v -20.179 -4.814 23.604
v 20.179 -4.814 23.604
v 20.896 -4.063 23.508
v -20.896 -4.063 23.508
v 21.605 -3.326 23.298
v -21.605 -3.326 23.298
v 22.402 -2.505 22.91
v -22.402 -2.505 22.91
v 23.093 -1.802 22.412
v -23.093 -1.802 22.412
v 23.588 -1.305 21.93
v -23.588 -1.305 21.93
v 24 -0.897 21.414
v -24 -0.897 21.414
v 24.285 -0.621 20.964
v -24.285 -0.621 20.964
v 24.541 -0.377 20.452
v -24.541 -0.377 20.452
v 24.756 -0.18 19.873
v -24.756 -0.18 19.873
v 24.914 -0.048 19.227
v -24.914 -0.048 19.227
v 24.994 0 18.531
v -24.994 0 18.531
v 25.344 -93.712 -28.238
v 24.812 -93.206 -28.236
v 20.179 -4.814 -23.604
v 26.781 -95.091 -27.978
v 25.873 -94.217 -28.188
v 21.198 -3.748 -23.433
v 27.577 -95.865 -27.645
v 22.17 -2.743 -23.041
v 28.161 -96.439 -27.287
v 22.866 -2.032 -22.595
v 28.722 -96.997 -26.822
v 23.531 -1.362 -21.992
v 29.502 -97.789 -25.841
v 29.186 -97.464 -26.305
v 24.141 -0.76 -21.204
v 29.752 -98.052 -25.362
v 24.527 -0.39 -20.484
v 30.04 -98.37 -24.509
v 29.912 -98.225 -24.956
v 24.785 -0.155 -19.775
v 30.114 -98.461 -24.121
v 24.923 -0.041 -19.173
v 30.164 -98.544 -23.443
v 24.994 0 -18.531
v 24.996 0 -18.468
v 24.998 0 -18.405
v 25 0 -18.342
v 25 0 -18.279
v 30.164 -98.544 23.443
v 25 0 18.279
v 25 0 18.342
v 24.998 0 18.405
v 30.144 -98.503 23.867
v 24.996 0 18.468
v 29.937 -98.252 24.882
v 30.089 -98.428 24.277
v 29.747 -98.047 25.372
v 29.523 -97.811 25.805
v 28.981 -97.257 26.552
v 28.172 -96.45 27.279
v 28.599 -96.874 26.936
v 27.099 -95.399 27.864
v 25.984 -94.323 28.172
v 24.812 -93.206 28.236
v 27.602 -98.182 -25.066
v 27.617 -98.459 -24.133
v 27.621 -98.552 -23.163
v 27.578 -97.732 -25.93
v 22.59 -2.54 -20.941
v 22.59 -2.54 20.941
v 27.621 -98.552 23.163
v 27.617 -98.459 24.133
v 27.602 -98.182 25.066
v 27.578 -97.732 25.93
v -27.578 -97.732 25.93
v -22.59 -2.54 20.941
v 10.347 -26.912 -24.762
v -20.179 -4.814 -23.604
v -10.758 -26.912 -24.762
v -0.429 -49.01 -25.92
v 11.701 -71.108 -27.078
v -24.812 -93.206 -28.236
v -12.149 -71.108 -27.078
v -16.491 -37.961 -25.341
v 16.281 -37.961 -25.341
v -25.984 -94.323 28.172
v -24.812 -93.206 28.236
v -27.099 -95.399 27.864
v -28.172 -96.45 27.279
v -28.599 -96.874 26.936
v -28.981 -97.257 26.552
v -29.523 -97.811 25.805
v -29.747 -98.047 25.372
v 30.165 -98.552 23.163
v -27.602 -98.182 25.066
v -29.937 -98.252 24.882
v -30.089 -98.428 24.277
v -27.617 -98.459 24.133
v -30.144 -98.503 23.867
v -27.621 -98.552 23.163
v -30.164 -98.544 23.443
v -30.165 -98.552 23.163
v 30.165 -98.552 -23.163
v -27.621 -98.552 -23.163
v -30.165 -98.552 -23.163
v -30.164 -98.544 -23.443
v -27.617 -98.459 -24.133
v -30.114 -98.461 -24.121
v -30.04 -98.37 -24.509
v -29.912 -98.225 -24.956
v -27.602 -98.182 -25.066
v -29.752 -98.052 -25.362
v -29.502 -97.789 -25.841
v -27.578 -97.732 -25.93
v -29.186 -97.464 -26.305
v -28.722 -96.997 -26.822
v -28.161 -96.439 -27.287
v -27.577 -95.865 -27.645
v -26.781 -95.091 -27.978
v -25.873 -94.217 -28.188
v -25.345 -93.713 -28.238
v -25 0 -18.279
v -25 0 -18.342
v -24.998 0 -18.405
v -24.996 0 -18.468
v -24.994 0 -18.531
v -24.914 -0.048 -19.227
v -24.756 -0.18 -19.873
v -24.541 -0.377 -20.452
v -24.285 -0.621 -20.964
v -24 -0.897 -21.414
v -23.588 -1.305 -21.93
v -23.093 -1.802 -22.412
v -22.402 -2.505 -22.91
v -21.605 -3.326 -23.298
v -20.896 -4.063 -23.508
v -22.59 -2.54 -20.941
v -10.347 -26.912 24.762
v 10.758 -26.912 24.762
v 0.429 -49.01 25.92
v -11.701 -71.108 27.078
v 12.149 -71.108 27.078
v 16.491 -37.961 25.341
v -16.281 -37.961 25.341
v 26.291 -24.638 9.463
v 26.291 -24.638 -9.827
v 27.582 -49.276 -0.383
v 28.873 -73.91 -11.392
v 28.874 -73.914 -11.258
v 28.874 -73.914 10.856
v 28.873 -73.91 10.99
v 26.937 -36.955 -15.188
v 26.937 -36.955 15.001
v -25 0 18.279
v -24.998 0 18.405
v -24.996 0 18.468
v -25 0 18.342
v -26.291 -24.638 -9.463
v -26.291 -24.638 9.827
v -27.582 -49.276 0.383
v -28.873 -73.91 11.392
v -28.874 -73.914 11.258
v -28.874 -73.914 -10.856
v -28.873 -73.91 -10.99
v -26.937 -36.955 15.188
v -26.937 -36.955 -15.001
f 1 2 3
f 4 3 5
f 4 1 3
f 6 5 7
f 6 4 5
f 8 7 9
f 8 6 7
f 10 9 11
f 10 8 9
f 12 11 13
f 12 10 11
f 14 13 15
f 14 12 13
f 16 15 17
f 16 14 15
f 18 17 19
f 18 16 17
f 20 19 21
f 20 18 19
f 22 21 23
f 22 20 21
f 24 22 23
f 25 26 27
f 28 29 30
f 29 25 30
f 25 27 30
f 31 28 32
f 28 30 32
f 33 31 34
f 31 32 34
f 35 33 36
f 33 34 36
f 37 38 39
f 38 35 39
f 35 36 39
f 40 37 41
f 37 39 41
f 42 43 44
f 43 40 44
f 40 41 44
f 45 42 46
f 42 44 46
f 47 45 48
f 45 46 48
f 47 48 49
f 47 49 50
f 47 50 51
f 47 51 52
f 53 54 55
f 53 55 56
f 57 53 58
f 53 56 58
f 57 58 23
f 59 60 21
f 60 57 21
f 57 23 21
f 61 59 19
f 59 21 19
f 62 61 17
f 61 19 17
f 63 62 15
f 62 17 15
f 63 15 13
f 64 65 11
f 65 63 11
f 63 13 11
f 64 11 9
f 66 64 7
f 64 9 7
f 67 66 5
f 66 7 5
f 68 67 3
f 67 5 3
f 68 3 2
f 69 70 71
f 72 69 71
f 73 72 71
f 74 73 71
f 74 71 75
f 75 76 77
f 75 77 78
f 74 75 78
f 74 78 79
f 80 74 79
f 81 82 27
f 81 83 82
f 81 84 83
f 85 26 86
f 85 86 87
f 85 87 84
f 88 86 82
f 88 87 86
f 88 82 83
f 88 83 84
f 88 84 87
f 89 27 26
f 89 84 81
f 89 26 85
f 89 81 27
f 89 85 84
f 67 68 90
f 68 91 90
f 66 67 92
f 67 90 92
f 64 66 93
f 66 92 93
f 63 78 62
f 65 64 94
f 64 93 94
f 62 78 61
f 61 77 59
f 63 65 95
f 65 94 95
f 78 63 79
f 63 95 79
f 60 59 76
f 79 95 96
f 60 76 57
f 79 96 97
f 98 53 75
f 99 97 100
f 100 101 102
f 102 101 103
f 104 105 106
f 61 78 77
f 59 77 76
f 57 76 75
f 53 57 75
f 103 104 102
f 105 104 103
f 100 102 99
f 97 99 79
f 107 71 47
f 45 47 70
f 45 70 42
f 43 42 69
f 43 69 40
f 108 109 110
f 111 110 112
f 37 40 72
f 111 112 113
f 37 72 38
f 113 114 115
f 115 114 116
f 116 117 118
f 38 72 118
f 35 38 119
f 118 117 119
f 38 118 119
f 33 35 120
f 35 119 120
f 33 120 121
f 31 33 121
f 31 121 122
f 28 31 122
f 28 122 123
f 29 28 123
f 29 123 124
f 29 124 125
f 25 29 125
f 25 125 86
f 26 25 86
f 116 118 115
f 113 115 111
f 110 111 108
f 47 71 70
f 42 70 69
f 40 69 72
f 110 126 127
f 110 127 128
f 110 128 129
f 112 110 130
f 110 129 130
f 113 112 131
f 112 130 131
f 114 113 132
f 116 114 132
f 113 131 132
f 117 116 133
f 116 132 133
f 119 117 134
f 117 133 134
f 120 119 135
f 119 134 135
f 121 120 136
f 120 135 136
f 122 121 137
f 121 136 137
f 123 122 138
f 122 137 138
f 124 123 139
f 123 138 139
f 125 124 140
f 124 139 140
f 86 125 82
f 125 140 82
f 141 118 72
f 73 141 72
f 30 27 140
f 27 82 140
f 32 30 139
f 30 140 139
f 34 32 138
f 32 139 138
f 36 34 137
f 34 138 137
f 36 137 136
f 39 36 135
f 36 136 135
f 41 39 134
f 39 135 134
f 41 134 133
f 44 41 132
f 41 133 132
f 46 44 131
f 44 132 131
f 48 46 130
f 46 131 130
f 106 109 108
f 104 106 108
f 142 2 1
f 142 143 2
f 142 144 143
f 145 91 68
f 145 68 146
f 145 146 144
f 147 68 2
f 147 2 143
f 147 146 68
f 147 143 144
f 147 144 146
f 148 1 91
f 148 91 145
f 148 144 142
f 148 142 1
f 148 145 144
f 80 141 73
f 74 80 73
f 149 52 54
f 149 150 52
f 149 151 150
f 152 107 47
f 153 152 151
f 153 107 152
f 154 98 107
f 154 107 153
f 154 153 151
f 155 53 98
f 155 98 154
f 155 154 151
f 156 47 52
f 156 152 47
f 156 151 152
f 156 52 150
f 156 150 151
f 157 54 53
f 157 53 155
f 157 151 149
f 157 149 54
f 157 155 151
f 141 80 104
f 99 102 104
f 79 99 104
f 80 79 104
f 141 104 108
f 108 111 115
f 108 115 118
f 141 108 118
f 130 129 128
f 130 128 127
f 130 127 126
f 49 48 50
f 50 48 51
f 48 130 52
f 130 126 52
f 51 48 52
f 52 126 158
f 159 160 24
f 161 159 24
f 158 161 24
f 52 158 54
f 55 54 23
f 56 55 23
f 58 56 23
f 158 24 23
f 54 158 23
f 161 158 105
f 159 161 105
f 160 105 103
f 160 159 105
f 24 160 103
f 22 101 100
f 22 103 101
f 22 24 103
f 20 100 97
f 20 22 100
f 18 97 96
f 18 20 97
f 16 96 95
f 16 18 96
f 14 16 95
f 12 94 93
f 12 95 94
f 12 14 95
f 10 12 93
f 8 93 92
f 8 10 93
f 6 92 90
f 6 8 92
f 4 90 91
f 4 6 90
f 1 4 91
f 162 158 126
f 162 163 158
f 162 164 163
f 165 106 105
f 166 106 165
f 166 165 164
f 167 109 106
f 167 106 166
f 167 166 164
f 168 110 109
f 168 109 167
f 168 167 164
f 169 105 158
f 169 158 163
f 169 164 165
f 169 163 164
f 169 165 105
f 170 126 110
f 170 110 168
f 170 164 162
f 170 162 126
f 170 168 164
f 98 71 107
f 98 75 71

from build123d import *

# Parameters (mm, degrees)
F0_W        = 50
F0_H        = 46.7033070608
F1_DEPTH    = 98.552
F1_TAPER    = -3
F2_T        = -2.54
F3_T1_DEPTH = 74.1036999946
F3_T3_DEPTH = 124.1528328785
F3_T5_DEPTH = 87.0957981099
F3_T7_DEPTH = 124.1528328785
F4_T1_DEPTH = 74.1036999946
F4_T3_DEPTH = 124.1528328785
F4_T5_DEPTH = 87.0957981099
F4_T7_DEPTH = 124.1528328785


# Not quite as in the source:
# - a fillet or chamfer that OpenCascade refuses, or shapes differently, is made with other operations: its cross-section is extruded or revolved along the edge and cut away or added


with BuildPart() as f1:
    # F0 (on Front) → F1 (new body)
    with BuildSketch(Plane.XZ):
        Rectangle(F0_W, F0_H)
    extrude(amount=F1_DEPTH, taper=F1_TAPER)

    # F2
    f2_openings = [f1.faces().sort_by_distance(p)[0] for p in [
        (0, -98.552, 0),
    ]]
    offset(amount=F2_T, openings=f2_openings)

    # F3: fillet of radius 5.08 on 4 edges, made by hand

    # F3_s2 → F3_t1 (cut)
    with BuildSketch(Plane.YZ.offset(-37.0518499973)):
        with BuildLine():
            ThreePointArc((-4.8141333423, 23.6039515681), (-1.3950981953, 22.027754776), (0, 18.5309135315))
            Line((0, 18.5309135315), (0, 23.3516535304))
            Line((0, 23.3516535304), (-4.8141333423, 23.6039515681))
        make_face()
    extrude(amount=F3_T1_DEPTH, mode=Mode.SUBTRACT)

    # F3_s4 → F3_t3 (cut)
    with BuildSketch(Plane(origin=(0.5298667006, 10.1104589396, -0.5298667006), x_dir=(0.9986295348, -0.0523359562, 0), z_dir=(-0.0522644277, -0.9972646886, 0.0522644277))):
        with BuildLine():
            ThreePointArc((-24.9657383689, 18.1852510398), (-23.4827569315, 21.7724306367), (-19.8996527546, 23.2652319837))
            Line((-19.8996527546, 23.2652319837), (-24.9657383689, 23.2513556581))
            Line((-24.9657383689, 23.2513556581), (-24.9657383689, 18.1852510398))
        make_face()
    extrude(amount=F3_T3_DEPTH, mode=Mode.SUBTRACT)

    # F3_s6 → F3_t5 (cut)
    with BuildSketch(Plane.YZ.offset(-43.547899055)):
        with BuildLine():
            ThreePointArc((-93.2061333423, 28.2363799944), (-96.9688412445, 26.8482437626), (-98.552, 23.1633419579))
            Line((-98.552, 23.1633419579), (-98.552, 28.5165449943))
            Line((-98.552, 28.5165449943), (-93.2061333423, 28.2363799944))
        make_face()
    extrude(amount=F3_T5_DEPTH, mode=Mode.SUBTRACT)

    # F3_s8 → F3_t7 (cut)
    with BuildSketch(Plane(origin=(-0.5298667006, 10.1104589396, -0.5298667006), x_dir=(0.9986295348, 0.0523359562, 0), z_dir=(0.0522644277, -0.9972646886, 0.0522644277))):
        with BuildLine():
            ThreePointArc((24.9657383689, 18.1852510398), (23.4827569315, 21.7724306367), (19.8996527546, 23.2652319837))
            Line((19.8996527546, 23.2652319837), (24.9657383689, 23.2513556581))
            Line((24.9657383689, 23.2513556581), (24.9657383689, 18.1852510398))
        make_face()
    extrude(amount=F3_T7_DEPTH, mode=Mode.SUBTRACT)

    # F4: fillet of radius 5.08 on 4 edges, made by hand

    # F4_s2 → F4_t1 (cut)
    with BuildSketch(Plane.YZ.offset(-37.0518499973)):
        with BuildLine():
            ThreePointArc((-4.8141333423, -23.6039515681), (-1.3950981953, -22.027754776), (0, -18.5309135315))
            Line((0, -18.5309135315), (0, -23.3516535304))
            Line((0, -23.3516535304), (-4.8141333423, -23.6039515681))
        make_face()
    extrude(amount=F4_T1_DEPTH, mode=Mode.SUBTRACT)

    # F4_s4 → F4_t3 (cut)
    with BuildSketch(Plane(origin=(-0.5298667006, 10.1104589396, 0.5298667006), x_dir=(0.9986295348, 0.0523359562, 0), z_dir=(0.0522644277, -0.9972646886, -0.0522644277))):
        with BuildLine():
            ThreePointArc((19.8996527546, -23.2652319837), (23.4827569315, -21.7724306367), (24.9657383689, -18.1852510398))
            Line((24.9657383689, -18.1852510398), (24.9657383689, -23.2513556581))
            Line((24.9657383689, -23.2513556581), (19.8996527546, -23.2652319837))
        make_face()
    extrude(amount=F4_T3_DEPTH, mode=Mode.SUBTRACT)

    # F4_s6 → F4_t5 (cut)
    with BuildSketch(Plane.YZ.offset(-43.547899055)):
        with BuildLine():
            ThreePointArc((-98.552, -23.1633419579), (-96.9688412445, -26.8482437626), (-93.2061333423, -28.2363799944))
            Line((-93.2061333423, -28.2363799944), (-98.552, -28.5165449943))
            Line((-98.552, -28.5165449943), (-98.552, -23.1633419579))
        make_face()
    extrude(amount=F4_T5_DEPTH, mode=Mode.SUBTRACT)

    # F4_s8 → F4_t7 (cut)
    with BuildSketch(Plane(origin=(0.5298667006, 10.1104589396, 0.5298667006), x_dir=(0.9986295348, -0.0523359562, 0), z_dir=(-0.0522644277, -0.9972646886, -0.0522644277))):
        with BuildLine():
            ThreePointArc((-24.9657383689, -18.1852510398), (-23.4827569315, -21.7724306367), (-19.8996527546, -23.2652319837))
            Line((-19.8996527546, -23.2652319837), (-24.9657383689, -23.2513556581))
            Line((-24.9657383689, -23.2513556581), (-24.9657383689, -18.1852510398))
        make_face()
    extrude(amount=F4_T7_DEPTH, mode=Mode.SUBTRACT)


solid = f1.part
